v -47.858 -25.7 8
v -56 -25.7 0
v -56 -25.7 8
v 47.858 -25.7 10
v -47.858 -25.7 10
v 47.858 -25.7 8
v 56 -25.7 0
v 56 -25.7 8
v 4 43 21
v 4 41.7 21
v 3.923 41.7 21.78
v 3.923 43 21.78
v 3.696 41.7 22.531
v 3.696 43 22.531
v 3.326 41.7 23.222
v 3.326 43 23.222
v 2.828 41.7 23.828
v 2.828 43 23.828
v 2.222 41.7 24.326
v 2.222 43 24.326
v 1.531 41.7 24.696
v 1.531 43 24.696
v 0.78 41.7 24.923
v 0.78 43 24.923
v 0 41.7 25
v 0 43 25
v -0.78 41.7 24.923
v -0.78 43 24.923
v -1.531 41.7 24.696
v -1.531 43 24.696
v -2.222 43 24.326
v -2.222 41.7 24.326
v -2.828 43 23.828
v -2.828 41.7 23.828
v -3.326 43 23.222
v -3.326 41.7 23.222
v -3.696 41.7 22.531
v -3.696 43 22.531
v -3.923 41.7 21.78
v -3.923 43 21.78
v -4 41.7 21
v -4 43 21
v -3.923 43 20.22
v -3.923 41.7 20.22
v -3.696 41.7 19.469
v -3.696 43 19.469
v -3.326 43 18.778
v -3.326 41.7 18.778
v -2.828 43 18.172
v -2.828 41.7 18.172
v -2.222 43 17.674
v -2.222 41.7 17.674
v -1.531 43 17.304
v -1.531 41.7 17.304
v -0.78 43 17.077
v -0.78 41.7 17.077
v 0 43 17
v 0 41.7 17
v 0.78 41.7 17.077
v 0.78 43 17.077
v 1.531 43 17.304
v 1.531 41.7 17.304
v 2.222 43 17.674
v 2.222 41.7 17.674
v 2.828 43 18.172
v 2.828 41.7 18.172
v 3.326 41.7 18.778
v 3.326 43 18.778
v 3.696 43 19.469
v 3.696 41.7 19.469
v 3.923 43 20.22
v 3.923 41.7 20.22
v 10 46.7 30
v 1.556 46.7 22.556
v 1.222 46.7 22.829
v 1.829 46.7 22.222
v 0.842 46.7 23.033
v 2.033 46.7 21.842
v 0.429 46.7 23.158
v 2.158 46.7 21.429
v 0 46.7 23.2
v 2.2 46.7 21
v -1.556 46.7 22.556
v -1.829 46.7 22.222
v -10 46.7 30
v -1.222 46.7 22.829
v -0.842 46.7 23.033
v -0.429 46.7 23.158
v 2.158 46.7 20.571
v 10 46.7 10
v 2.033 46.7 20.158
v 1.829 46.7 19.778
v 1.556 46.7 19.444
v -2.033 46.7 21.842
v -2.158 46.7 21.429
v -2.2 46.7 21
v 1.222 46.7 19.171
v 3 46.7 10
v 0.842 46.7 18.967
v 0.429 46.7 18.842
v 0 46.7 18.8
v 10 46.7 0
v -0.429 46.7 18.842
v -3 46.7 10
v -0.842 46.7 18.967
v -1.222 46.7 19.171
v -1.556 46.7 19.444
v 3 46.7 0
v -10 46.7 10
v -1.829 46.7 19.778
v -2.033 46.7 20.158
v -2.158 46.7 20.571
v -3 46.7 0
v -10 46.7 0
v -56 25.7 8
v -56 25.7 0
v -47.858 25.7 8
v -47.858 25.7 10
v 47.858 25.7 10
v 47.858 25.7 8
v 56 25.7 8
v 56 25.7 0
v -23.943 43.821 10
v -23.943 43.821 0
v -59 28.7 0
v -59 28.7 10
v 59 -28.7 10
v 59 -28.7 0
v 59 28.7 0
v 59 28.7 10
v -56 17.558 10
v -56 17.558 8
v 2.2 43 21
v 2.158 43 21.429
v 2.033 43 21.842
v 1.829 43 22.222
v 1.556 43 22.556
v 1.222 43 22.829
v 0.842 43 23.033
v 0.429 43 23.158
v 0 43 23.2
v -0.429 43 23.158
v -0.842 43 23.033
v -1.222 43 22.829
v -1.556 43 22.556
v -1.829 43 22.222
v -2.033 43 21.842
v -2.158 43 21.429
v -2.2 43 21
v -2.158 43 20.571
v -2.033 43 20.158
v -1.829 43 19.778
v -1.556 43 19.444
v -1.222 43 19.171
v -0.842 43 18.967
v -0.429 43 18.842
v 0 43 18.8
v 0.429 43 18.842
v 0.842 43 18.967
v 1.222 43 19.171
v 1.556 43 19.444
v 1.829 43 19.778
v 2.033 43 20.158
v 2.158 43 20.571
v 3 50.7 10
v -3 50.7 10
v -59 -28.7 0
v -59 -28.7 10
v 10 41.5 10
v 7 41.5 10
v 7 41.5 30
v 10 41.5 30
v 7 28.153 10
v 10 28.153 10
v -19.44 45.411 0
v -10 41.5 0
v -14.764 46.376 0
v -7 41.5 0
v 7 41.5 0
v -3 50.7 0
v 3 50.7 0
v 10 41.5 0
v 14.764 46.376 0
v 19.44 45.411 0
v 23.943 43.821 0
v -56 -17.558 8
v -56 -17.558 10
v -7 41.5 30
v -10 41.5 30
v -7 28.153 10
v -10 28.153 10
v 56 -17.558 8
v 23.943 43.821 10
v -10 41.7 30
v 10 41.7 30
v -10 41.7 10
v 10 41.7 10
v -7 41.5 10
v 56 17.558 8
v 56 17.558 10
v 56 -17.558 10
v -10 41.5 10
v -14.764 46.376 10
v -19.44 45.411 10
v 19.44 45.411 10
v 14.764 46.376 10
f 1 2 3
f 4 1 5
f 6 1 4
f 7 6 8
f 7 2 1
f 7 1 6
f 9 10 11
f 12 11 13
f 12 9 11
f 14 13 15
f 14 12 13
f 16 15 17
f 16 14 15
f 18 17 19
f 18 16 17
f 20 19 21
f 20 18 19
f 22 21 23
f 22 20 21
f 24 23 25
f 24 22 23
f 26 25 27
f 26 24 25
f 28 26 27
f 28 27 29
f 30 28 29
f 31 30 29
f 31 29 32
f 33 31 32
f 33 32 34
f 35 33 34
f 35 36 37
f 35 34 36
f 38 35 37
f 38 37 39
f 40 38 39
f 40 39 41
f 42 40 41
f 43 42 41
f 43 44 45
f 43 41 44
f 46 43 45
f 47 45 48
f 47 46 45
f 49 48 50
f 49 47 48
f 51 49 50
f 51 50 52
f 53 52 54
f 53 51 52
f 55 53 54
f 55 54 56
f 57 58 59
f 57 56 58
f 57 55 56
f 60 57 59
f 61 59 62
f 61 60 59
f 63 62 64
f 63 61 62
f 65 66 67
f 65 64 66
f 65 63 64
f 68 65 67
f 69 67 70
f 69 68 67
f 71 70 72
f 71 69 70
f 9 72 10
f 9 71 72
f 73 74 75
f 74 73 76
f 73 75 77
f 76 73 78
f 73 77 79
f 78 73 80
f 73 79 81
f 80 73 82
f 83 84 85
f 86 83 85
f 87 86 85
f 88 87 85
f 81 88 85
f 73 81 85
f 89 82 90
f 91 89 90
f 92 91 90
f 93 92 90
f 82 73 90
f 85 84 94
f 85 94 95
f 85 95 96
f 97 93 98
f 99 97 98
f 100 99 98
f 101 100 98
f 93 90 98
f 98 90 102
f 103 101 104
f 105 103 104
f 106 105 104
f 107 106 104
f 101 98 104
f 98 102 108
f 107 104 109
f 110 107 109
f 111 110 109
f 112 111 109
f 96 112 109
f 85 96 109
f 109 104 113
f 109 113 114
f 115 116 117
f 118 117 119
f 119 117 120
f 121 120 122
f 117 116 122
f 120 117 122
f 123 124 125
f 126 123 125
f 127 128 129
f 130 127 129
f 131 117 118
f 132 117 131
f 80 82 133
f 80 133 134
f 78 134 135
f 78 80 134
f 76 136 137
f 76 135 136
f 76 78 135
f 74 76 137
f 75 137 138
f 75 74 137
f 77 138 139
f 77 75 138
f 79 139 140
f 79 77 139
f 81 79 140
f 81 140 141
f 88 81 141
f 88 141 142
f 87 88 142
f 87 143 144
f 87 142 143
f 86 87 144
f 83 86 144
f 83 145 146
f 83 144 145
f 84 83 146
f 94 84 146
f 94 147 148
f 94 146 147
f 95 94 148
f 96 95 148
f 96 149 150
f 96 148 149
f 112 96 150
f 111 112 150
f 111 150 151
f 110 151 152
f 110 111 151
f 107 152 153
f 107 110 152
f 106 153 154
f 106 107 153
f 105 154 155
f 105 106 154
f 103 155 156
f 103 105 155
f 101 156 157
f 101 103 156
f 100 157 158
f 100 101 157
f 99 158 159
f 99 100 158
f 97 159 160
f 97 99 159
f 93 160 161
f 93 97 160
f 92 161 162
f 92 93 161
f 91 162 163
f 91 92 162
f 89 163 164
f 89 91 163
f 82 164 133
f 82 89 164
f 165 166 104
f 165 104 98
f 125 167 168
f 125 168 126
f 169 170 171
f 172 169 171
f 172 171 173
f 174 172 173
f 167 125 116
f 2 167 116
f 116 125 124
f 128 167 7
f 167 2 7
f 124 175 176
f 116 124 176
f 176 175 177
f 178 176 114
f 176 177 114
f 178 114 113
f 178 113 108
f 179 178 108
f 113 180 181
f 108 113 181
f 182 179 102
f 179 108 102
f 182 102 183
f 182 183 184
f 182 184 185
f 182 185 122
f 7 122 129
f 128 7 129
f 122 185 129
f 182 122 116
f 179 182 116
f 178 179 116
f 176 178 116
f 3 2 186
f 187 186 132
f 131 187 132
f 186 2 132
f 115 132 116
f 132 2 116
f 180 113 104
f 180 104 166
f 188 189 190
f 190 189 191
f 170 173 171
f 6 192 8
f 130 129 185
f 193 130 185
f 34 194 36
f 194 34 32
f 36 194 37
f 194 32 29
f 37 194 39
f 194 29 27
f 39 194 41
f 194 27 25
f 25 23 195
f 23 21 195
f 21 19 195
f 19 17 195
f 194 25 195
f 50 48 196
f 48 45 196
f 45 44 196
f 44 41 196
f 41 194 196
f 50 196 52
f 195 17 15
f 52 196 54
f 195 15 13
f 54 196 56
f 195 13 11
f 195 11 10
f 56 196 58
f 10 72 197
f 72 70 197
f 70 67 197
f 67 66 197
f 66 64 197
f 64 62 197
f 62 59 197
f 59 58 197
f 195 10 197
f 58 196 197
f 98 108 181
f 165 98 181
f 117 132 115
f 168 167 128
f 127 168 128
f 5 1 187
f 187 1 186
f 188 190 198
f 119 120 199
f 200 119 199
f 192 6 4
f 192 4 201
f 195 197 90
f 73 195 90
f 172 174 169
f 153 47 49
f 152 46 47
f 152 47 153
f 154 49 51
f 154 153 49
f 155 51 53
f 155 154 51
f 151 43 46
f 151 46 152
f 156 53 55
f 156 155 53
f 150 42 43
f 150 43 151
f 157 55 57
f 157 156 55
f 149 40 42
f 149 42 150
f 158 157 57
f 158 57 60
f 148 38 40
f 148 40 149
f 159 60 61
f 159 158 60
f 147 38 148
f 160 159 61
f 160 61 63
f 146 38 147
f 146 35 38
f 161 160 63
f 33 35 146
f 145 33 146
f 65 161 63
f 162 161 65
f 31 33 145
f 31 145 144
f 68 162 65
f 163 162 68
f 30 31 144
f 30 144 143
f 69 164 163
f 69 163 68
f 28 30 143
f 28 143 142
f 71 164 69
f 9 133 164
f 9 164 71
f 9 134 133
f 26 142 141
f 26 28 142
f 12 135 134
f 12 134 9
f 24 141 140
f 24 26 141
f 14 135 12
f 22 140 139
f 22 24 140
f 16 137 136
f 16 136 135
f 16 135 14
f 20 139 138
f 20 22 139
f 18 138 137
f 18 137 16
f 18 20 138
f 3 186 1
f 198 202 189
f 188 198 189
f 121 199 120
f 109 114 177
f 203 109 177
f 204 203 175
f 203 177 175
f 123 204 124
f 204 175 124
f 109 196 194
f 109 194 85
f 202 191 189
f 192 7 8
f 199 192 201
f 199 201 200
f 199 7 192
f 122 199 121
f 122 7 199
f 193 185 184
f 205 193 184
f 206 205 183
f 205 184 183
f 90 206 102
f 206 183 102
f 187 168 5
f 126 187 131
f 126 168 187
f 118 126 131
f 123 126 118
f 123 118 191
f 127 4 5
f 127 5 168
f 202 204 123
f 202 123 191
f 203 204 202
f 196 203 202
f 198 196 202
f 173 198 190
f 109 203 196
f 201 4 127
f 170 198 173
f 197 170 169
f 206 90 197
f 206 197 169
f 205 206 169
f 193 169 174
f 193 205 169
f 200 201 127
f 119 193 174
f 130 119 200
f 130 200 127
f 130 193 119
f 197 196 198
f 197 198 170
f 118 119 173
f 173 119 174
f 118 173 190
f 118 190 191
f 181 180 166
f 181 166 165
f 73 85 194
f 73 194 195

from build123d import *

# Parameters (mm, degrees)
PAD003_DEPTH      = 2
BOX005_W          = 112
BOX005_H          = 51.4
BOX005_DEPTH      = 10
BOX004_W          = 118
BOX004_H          = 57.4
BOX004_DEPTH      = 10
PAD004_DEPTH      = 3
ARRAY001_X_COUNT  = 2
ARRAY001_X_PITCH  = 17
CYLINDER001_R     = 4
CYLINDER001_DEPTH = 30
CYLINDER_R        = 2.2
CYLINDER_DEPTH    = 30
BOX006_W          = 20
BOX006_H          = 5
BOX006_DEPTH      = 30
BOX007_W          = 6
BOX007_H          = 4
BOX007_DEPTH      = 10
PAD002_DEPTH      = 10


with BuildPart() as body003:
    # Sketch003 → Pad003 (new body)
    with BuildSketch(Plane.XY):
        Polygon((-59, -28.7), (-44.857864, -28.7), (-59, -14.557864), align=None)
    extrude(amount=PAD003_DEPTH)


with BuildPart() as part_mirroring001:
    # Part__Mirroring001: instance of Body003
    add(body003.part.mirror(Plane(origin=(0, 0, 0), x_dir=(1, 0, 0), z_dir=(0, 1, 0))))


with BuildPart() as fusion005:
    # Fusion005 base: copy of Body003
    add(body003.part)

    # Fusion005: union Part__Mirroring001
    add(part_mirroring001.part)


with BuildPart() as corners_fusion:
    # Part__Mirroring002: instance of Fusion005
    add(fusion005.part.mirror(Plane(origin=(0, 0, 0), x_dir=(0, -1, 0), z_dir=(1, 0, 0))))

    # Fusion006: union Fusion005
    add(fusion005.part)


with BuildPart() as corners_fusion_1:
    # Fusion006 placement: moved
    add(corners_fusion.part.moved(Location((0, 0, 8))))


with BuildPart() as middle_pocket_cube:
    # Box005 → Box005 (new body)
    with BuildSketch(Plane(origin=(-56, -25.7, 0), x_dir=(1, 0, 0), z_dir=(0, 0, 1))):
        with Locations((56, 25.7)):
            Rectangle(BOX005_W, BOX005_H)
    extrude(amount=BOX005_DEPTH)


with BuildPart() as middle_external:
    # Box004 → Box004 (new body)
    with BuildSketch(Plane(origin=(-59, -28.7, 0), x_dir=(1, 0, 0), z_dir=(0, 0, 1))):
        with Locations((59, 28.7)):
            Rectangle(BOX004_W, BOX004_H)
    extrude(amount=BOX004_DEPTH)


with BuildPart() as triangles_array:
    # Sketch004 → Pad004 (new body)
    with BuildSketch(Plane.YZ):
        Polygon((41.5, 30), (27.205015, 8.579618), (41.5, 0), align=None)
    extrude(amount=PAD004_DEPTH)

    # Array001 X: triangles array ×2


with BuildPart() as triangles_array_1:
    add(triangles_array.part)
    with Locations(*[(i * ARRAY001_X_PITCH, 0, 0) for i in range(1, ARRAY001_X_COUNT)]):
        add(triangles_array.part)


with BuildPart() as triangles_array_2:
    # Array001 placement: moved
    add(triangles_array_1.part.moved(Location((-10, 0, 0))))


with BuildPart() as bolt_head_hole:
    # Cylinder001 → Cylinder001 (new body)
    with BuildSketch(Plane.XZ.offset(14)):
        Circle(CYLINDER001_R)
    extrude(amount=CYLINDER001_DEPTH)


with BuildPart() as bolt_fusion_clone:
    # Cylinder → Cylinder (new body)
    with BuildSketch(Plane.XZ):
        Circle(CYLINDER_R)
    extrude(amount=CYLINDER_DEPTH)

    # Fusion002: union bolt head hole
    add(bolt_head_hole.part)


with BuildPart() as bolt_fusion_clone_1:
    # Body005 placement: moved
    add(bolt_fusion_clone.part.moved(Location((0, 57, 21))))


with BuildPart() as middle_attach_cube:
    # Box006 → Box006 (new body)
    with BuildSketch(Plane(origin=(-10, 0, 0), x_dir=(1, 0, 0), z_dir=(0, 0, 1))):
        with Locations((10, 2.5)):
            Rectangle(BOX006_W, BOX006_H)
    extrude(amount=BOX006_DEPTH)


with BuildPart() as middle_attach_cut:
    # Box007 → Box007 (new body)
    with BuildSketch(Plane(origin=(-3, 5, 0), x_dir=(1, 0, 0), z_dir=(0, 0, 1))):
        with Locations((3, 2)):
            Rectangle(BOX007_W, BOX007_H)
    extrude(amount=BOX007_DEPTH)

    # Fusion008: union middle attach cube
    add(middle_attach_cube.part)


with BuildPart() as middle_attach_cut_1:
    # Fusion008 placement: moved
    add(middle_attach_cut.part.moved(Location((0, 41.7, 0))))

    # Cut002: cut bolt fusion clone
    add(bolt_fusion_clone_1.part, mode=Mode.SUBTRACT)


with BuildPart() as middle_with_corners:
    # Sketch002 → Pad002 (new body)
    with BuildSketch(Plane.XY):
        with BuildLine():
            Line((-59, 28.7), (59, 28.7))
            Line((59, 28.7), (23.942659, 43.821249))
            ThreePointArc((23.942659, 43.821249), (17.118373, 45.972801), (10, 46.7))
            Line((10, 46.7), (-10, 46.7))
            ThreePointArc((-10, 46.7), (-17.118373, 45.972801), (-23.942659, 43.821249))
            Line((-23.942659, 43.821249), (-59, 28.7))
        make_face()
    extrude(amount=PAD002_DEPTH)

    # Fusion004: union middle external, triangles array, middle attach cut
    add(middle_external.part)
    add(triangles_array_2.part)
    add(middle_attach_cut_1.part)

    # Cut: cut middle pocket cube
    add(middle_pocket_cube.part, mode=Mode.SUBTRACT)

    # Fusion007: union corners fusion
    add(corners_fusion_1.part)


solid = middle_with_corners.part
